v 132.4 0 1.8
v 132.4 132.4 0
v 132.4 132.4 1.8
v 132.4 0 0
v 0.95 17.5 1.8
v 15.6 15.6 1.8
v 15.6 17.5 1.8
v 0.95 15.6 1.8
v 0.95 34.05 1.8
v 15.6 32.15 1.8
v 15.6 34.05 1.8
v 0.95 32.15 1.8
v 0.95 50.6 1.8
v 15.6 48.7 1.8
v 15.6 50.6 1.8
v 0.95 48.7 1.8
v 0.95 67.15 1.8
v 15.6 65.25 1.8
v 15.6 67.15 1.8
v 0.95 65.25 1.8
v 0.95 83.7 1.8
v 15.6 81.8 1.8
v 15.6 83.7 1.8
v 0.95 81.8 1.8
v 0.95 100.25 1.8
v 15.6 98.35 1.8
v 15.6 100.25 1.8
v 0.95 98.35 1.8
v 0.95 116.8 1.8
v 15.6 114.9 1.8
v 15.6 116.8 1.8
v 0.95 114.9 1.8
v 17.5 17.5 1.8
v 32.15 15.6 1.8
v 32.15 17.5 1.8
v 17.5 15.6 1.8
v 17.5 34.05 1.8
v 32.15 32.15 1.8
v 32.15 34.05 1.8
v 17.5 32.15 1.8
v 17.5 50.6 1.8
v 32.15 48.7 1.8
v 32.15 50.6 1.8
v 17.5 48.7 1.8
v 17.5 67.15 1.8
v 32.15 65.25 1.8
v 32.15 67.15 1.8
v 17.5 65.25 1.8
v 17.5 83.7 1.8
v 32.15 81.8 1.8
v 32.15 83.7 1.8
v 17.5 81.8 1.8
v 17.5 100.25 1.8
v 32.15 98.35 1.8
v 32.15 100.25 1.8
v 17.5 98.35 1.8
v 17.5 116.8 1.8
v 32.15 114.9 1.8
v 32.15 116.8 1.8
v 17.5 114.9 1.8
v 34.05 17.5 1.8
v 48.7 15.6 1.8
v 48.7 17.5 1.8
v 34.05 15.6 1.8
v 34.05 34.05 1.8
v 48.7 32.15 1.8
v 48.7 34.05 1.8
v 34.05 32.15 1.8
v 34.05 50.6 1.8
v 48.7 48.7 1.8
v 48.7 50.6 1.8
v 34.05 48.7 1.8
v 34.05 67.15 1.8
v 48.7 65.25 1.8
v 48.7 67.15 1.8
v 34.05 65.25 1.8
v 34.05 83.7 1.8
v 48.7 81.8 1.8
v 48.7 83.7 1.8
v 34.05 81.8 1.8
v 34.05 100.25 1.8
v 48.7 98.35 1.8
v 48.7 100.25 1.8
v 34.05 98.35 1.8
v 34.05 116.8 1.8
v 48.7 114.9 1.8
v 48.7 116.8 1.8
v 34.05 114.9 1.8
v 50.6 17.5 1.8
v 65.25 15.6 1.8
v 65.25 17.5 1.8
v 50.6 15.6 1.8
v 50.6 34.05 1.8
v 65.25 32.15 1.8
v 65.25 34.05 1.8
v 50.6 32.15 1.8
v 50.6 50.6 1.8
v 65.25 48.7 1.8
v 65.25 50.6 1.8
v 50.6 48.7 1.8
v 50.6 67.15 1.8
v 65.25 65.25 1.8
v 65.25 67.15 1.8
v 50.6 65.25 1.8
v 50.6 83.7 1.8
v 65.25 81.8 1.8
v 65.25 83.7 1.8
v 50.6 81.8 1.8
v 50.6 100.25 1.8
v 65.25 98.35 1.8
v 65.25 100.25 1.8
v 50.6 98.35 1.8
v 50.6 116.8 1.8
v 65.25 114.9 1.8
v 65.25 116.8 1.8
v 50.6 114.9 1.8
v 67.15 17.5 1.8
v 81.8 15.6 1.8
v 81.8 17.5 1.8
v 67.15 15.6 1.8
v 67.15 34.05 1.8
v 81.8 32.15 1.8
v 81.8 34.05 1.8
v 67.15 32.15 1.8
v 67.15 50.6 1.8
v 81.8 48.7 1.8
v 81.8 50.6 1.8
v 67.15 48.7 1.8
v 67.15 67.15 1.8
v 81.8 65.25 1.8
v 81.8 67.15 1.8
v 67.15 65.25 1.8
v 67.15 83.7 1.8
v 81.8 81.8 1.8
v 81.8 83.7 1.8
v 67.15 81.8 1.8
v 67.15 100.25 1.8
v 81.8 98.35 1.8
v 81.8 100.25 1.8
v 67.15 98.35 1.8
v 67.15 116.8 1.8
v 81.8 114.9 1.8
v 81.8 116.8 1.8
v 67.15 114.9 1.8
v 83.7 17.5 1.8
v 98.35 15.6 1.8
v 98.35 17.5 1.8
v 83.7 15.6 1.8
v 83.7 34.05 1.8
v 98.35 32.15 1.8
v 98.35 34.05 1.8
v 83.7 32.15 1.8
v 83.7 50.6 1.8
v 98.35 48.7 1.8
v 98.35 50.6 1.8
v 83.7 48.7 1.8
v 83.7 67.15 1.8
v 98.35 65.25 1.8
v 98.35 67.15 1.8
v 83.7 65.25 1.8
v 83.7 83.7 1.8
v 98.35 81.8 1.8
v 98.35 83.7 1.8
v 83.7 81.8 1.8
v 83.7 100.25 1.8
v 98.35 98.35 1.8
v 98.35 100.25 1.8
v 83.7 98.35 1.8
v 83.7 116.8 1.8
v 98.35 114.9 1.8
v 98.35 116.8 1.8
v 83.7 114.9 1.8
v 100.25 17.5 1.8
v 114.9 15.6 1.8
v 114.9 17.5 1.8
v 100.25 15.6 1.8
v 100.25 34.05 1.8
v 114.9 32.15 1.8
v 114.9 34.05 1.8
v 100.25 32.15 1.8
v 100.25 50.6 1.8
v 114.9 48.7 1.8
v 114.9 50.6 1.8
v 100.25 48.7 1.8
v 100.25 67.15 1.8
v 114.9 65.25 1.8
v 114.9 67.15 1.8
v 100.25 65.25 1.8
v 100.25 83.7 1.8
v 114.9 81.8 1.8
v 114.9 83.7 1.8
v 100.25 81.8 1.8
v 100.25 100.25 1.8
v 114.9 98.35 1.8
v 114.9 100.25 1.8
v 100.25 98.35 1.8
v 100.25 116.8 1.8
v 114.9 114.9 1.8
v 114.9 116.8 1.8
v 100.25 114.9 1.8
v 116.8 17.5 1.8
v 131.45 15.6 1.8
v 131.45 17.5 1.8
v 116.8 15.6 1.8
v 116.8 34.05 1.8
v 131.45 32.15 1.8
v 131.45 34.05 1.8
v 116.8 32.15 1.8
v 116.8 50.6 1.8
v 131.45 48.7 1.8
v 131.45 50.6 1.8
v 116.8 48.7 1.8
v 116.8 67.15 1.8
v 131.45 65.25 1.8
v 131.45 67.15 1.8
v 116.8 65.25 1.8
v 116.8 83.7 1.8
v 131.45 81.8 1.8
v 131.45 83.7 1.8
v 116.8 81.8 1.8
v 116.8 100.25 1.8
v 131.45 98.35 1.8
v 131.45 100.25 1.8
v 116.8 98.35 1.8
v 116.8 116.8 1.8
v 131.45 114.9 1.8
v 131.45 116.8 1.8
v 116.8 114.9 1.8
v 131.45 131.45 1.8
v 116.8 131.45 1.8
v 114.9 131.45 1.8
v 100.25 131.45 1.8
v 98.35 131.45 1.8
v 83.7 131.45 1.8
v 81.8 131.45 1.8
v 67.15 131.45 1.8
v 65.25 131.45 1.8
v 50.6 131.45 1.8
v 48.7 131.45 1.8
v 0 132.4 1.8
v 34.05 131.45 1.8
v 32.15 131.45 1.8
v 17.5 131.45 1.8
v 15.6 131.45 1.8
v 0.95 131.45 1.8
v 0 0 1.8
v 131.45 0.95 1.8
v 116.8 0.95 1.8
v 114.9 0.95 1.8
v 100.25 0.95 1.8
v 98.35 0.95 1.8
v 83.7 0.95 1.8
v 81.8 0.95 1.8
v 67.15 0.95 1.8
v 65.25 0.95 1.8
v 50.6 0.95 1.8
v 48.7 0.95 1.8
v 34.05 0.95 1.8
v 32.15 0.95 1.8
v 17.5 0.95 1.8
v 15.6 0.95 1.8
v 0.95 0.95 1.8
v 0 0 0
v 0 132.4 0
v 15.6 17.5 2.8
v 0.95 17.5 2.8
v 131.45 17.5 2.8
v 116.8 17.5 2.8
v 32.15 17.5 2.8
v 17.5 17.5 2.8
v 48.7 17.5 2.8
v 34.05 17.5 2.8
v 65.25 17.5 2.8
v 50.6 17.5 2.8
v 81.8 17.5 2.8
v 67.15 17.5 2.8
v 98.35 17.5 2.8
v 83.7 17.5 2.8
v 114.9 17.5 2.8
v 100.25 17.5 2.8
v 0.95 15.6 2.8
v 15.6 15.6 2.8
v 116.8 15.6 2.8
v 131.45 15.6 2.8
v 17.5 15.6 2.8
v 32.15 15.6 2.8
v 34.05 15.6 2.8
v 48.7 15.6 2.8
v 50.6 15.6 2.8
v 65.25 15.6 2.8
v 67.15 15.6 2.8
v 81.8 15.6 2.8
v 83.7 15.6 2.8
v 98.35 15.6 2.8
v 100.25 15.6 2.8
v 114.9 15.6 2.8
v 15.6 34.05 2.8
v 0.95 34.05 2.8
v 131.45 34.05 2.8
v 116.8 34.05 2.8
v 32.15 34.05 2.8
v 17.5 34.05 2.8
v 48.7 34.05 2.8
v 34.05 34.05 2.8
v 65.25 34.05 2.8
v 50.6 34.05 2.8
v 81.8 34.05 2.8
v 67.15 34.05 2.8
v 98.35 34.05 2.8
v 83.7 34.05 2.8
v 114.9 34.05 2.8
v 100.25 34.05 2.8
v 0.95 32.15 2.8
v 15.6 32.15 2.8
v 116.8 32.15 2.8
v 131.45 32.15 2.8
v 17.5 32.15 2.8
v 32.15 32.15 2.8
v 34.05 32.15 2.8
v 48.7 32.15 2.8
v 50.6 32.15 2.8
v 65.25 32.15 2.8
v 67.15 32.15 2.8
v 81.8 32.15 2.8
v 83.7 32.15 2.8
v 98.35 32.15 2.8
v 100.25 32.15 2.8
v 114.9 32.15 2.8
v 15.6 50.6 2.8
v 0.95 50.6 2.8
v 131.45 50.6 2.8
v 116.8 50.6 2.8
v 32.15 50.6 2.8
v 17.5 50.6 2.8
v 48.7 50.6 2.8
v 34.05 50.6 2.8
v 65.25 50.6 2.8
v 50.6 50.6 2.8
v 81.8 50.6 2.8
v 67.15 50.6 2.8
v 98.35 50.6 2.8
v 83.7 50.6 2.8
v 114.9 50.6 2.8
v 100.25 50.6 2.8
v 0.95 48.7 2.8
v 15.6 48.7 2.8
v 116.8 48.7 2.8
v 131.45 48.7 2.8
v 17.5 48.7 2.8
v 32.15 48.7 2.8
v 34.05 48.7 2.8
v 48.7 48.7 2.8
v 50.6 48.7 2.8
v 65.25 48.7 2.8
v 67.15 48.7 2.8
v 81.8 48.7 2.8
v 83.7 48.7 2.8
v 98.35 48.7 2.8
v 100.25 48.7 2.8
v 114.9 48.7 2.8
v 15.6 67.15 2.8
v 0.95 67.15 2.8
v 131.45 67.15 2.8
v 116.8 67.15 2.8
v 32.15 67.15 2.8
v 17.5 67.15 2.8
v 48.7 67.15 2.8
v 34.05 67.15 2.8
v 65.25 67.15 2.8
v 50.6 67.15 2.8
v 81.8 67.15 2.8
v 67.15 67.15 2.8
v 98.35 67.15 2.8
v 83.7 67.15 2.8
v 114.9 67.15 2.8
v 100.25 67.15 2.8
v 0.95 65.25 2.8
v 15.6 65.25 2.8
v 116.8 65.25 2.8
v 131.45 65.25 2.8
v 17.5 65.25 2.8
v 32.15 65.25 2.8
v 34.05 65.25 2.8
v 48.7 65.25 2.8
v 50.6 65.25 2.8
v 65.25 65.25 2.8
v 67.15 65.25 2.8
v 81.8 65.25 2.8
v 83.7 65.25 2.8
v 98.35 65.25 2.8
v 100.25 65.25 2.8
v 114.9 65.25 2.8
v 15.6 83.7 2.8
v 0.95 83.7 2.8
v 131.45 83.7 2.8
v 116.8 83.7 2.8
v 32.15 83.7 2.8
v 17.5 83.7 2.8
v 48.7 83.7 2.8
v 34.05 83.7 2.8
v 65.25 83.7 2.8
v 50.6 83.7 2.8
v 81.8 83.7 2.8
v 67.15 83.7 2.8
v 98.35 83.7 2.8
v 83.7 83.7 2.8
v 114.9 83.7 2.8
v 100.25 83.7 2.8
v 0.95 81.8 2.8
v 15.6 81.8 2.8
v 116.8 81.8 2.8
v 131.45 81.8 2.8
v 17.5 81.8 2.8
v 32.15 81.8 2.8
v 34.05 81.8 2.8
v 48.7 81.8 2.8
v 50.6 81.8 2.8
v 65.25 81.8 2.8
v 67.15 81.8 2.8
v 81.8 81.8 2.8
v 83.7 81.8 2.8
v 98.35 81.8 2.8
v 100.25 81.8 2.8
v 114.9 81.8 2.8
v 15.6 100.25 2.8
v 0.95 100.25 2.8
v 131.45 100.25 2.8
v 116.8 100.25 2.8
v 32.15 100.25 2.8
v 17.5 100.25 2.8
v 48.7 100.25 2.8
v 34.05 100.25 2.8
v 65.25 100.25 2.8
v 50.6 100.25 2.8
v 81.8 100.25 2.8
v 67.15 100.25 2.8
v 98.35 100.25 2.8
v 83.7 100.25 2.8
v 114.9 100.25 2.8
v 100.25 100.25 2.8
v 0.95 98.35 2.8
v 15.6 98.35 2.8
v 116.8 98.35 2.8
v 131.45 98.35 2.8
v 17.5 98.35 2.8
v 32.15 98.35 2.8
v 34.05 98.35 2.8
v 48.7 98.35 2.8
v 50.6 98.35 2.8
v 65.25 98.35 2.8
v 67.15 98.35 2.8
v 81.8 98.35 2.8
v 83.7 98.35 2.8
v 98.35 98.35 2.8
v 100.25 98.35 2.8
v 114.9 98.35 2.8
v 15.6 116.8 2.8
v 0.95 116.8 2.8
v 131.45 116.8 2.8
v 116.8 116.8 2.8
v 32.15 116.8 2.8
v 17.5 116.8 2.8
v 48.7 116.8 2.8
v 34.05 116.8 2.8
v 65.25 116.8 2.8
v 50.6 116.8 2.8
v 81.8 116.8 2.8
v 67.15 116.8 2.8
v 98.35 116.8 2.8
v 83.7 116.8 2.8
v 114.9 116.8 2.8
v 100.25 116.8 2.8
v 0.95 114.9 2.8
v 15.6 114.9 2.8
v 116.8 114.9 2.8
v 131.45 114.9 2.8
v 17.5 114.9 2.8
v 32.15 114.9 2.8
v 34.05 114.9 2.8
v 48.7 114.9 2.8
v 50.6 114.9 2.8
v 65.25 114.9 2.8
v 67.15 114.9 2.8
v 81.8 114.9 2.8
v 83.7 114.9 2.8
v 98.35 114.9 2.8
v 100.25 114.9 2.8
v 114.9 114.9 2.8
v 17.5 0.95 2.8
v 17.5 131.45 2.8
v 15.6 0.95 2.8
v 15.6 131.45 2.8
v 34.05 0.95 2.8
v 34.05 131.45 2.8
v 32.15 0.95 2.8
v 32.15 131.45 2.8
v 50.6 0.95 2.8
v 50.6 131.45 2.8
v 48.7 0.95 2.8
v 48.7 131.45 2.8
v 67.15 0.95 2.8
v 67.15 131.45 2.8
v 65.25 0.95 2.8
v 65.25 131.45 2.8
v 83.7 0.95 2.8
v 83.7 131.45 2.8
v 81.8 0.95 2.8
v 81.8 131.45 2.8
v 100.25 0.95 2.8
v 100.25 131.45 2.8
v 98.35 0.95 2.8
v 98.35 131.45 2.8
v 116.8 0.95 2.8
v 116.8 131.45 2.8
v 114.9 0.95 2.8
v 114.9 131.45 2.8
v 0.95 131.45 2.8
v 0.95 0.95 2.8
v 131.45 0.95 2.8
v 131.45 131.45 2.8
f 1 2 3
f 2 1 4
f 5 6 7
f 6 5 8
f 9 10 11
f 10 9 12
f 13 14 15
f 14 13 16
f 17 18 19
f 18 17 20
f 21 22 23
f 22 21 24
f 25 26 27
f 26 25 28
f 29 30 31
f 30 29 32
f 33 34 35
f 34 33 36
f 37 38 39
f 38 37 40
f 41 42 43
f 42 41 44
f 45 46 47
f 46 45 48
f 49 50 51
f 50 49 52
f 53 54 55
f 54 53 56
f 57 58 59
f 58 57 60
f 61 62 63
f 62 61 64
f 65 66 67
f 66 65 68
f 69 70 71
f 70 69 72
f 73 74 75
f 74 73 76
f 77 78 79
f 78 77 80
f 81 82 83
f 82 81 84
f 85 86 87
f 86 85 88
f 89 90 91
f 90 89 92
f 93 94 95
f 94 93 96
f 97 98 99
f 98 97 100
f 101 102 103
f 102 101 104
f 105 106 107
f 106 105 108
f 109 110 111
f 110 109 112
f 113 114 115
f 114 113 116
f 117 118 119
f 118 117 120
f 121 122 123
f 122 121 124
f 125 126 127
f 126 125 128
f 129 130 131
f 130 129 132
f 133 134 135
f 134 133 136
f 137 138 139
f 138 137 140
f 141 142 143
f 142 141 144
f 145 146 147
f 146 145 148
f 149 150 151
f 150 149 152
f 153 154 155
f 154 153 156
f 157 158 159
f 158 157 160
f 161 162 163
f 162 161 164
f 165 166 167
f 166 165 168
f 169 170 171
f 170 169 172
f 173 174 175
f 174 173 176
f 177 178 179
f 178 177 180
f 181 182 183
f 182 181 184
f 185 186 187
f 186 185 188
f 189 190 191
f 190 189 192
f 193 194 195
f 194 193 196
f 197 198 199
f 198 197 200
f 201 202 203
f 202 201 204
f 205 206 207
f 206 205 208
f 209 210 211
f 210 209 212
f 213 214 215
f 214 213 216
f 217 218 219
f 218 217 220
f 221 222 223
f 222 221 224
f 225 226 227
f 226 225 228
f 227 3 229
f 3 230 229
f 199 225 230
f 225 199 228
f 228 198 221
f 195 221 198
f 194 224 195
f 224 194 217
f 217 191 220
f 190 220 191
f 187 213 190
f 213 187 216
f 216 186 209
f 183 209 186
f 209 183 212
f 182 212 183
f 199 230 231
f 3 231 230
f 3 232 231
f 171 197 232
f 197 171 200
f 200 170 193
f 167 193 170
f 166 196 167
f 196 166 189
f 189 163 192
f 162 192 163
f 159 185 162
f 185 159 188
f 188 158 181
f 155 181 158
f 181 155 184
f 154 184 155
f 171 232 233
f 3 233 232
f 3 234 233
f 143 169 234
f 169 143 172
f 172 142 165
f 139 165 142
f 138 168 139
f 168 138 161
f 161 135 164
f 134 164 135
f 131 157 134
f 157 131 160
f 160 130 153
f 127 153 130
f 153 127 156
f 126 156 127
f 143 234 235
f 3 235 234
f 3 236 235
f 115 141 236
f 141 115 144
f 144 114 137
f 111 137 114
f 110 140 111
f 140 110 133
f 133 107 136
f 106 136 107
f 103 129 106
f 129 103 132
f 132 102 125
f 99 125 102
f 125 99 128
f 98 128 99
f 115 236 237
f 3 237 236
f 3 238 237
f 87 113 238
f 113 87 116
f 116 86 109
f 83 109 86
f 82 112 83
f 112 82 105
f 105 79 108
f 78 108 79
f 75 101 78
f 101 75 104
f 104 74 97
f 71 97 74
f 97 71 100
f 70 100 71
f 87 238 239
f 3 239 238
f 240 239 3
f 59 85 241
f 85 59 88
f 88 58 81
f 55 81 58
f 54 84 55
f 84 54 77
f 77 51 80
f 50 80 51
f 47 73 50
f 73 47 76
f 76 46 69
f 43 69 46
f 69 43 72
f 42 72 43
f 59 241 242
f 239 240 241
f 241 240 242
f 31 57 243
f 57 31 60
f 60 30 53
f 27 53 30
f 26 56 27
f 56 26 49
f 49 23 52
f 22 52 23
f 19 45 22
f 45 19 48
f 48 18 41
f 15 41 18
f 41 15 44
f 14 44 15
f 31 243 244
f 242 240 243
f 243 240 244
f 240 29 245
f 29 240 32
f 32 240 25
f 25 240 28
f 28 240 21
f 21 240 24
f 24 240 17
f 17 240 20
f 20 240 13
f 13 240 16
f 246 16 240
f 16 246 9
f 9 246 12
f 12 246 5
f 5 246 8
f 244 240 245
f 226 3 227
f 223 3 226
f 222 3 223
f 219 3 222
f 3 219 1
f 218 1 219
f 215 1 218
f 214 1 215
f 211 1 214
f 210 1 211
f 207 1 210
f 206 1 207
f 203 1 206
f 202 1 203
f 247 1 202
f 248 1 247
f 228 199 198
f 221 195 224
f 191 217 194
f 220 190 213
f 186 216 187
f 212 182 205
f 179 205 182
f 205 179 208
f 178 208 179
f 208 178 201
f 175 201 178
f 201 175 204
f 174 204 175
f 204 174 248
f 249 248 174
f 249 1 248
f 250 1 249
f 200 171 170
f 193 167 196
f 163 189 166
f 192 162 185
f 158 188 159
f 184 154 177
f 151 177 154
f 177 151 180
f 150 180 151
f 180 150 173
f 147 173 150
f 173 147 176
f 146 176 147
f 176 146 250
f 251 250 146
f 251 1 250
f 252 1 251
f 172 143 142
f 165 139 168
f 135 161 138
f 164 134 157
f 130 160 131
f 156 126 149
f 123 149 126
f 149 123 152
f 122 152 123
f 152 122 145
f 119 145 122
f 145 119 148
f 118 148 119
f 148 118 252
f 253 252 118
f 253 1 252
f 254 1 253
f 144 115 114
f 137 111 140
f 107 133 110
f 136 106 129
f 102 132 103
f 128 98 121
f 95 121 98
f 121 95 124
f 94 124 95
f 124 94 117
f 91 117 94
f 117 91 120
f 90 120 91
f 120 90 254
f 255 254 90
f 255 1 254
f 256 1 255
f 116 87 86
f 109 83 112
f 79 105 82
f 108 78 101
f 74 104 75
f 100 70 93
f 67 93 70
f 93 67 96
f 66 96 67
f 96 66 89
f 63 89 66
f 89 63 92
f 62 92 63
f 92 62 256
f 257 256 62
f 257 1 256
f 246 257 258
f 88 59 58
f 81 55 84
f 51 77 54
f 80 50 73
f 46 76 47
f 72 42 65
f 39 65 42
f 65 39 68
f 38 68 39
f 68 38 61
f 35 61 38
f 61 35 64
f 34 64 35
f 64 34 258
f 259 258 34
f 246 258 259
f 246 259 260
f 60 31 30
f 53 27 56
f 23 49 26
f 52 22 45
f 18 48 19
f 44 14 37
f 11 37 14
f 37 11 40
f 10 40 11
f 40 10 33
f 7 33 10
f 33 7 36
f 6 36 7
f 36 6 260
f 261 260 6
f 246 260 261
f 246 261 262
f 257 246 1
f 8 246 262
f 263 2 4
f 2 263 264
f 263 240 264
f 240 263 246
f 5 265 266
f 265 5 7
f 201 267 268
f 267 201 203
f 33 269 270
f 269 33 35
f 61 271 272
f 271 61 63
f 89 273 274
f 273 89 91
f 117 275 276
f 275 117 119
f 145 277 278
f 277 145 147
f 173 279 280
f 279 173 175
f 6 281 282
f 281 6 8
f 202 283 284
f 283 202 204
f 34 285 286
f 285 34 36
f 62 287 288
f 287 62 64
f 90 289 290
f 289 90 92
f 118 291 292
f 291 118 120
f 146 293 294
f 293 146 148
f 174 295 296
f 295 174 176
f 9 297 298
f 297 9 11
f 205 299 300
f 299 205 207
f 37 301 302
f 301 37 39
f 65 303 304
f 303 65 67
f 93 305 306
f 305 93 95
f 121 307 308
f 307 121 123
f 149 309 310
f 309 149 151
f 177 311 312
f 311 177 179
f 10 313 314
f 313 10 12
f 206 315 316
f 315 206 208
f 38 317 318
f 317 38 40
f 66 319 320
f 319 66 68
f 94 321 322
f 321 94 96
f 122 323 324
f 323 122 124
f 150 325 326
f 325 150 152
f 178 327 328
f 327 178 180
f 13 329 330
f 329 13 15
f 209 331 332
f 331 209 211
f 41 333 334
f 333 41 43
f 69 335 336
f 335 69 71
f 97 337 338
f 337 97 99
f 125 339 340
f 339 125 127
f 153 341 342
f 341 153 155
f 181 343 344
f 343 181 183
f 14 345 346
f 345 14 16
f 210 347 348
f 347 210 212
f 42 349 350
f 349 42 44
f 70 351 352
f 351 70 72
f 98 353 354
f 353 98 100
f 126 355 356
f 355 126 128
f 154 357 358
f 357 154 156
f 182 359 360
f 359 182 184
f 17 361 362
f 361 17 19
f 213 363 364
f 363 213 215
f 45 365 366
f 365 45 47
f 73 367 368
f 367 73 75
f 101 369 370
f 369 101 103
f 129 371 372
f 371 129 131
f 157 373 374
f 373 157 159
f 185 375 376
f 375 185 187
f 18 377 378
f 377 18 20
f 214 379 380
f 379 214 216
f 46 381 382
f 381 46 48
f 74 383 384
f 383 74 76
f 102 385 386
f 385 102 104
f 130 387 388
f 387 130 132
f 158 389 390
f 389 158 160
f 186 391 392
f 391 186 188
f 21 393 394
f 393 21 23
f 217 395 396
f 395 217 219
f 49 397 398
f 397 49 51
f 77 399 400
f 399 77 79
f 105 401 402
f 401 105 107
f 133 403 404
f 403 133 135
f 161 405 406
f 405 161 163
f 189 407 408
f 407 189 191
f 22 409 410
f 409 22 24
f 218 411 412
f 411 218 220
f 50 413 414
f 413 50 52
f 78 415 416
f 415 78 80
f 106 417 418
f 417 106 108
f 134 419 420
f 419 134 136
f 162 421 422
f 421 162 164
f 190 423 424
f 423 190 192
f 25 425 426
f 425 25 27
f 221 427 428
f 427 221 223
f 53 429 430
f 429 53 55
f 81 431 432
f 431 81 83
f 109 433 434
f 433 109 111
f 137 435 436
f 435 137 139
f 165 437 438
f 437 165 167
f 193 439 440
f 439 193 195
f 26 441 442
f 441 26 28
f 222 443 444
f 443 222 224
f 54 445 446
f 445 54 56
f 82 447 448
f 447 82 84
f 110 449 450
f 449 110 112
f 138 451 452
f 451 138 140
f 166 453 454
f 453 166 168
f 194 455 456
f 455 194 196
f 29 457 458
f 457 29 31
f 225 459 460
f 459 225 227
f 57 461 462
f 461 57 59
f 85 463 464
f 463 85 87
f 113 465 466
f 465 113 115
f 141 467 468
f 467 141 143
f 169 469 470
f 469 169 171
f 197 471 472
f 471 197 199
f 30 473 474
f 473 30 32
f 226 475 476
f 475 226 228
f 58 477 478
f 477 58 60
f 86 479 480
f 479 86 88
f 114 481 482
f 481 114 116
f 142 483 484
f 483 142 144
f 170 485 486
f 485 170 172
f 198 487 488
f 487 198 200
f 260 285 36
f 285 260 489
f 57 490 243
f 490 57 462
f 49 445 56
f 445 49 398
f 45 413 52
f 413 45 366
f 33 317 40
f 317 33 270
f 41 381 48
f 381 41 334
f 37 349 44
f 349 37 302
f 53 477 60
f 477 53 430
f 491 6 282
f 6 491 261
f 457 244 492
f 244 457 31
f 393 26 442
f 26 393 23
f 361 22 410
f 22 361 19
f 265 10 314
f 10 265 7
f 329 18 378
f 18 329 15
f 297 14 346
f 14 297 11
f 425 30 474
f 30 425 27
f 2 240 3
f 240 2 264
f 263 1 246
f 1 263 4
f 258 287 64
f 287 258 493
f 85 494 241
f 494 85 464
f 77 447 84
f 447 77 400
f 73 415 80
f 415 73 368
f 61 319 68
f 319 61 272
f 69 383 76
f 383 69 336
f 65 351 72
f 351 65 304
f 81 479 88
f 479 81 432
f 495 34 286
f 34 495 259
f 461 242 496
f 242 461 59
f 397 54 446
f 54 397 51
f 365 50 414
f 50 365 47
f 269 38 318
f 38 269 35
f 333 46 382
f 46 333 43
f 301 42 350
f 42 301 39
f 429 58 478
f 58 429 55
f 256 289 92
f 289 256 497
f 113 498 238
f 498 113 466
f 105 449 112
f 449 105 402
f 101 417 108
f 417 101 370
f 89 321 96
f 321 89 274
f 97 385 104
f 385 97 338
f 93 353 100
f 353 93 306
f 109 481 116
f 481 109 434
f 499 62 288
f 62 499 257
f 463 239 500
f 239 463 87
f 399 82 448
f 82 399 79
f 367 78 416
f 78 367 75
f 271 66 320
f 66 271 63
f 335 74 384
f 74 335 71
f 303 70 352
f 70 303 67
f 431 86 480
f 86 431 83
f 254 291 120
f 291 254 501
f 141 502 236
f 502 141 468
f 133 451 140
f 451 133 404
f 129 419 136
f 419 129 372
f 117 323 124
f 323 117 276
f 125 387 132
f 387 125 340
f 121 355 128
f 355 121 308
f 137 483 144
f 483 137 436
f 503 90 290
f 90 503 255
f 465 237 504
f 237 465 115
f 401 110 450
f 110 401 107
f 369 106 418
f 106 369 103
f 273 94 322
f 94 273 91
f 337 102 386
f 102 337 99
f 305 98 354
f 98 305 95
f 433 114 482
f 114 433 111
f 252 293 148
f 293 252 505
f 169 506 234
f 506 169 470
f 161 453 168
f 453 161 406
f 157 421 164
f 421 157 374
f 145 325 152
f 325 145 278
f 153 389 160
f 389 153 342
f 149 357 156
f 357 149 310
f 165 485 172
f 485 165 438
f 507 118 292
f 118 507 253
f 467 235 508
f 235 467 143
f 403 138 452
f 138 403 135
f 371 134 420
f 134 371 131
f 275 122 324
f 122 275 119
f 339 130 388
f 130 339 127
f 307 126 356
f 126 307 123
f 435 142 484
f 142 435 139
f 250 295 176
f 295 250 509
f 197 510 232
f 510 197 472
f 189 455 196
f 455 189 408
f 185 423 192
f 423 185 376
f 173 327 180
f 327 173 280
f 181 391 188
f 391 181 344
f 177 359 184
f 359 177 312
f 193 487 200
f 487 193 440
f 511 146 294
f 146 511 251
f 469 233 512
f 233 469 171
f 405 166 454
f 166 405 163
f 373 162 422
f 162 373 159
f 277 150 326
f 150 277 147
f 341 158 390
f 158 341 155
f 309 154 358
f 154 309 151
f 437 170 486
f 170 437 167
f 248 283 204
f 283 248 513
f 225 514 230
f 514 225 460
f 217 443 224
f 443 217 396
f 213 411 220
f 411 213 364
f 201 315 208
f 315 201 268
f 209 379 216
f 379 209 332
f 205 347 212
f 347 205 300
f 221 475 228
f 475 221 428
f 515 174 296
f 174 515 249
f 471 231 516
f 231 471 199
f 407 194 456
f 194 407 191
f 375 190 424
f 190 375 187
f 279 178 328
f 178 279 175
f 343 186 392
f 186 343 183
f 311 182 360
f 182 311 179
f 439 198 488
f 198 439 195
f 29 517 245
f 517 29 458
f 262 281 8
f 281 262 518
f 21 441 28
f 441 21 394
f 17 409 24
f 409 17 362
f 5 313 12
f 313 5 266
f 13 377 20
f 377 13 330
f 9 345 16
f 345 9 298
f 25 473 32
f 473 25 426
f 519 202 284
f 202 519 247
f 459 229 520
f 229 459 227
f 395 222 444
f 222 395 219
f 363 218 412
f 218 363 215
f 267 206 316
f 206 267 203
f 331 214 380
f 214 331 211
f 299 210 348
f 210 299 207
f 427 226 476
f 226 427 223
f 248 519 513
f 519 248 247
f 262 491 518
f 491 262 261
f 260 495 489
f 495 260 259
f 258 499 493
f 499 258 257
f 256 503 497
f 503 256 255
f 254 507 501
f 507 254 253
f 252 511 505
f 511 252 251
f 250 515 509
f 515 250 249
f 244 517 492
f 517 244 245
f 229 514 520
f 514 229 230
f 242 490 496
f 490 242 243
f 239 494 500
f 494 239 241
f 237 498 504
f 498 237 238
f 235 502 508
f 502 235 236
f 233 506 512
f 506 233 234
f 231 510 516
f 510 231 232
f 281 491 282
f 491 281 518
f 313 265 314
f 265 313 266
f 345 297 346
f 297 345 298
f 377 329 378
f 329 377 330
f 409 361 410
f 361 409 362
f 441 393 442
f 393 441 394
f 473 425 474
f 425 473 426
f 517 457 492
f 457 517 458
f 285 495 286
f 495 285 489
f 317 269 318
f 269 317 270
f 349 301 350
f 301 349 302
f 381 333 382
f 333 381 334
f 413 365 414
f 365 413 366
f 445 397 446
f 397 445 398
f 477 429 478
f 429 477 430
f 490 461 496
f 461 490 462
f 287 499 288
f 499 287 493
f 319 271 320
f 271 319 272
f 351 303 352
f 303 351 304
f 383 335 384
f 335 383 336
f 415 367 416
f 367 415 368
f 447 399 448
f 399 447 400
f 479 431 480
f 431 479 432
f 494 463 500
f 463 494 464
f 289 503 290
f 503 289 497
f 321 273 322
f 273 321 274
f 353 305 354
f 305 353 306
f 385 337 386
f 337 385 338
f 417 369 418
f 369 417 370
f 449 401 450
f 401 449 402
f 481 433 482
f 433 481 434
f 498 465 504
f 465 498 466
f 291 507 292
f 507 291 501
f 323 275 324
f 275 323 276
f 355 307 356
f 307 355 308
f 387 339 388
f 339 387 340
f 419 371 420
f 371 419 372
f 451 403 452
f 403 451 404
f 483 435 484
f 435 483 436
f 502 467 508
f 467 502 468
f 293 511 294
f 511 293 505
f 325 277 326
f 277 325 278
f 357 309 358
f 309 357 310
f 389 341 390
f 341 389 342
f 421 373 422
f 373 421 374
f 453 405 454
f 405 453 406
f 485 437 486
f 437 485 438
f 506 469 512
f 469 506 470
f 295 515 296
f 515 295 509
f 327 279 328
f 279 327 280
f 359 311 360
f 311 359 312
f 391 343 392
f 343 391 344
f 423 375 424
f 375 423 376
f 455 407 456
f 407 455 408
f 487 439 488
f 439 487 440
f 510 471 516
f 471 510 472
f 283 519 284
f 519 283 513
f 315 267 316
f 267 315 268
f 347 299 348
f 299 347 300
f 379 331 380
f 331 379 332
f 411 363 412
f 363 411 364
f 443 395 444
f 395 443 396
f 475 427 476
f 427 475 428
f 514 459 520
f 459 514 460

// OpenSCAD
// file: ../config.scad
// General
countX = 8;
countY = 8;

// Based on the LED strips you want to use
ledSize = 4.85;
ledSpacing = 11.7;
ledStripWidth = 10.3;
cellSize = ledSize + ledSpacing;

// Top plate
pixelSpacing = 1.90; 
pixelSize = cellSize - pixelSpacing; 
pixelHeight = 1.00; 
plateHeight = 1.80; 

// Back plate
backPlateHeight = 3.0;
backPlateCutoutWidth = 11.0;
backPlateCutoutDepth = 1.0;
backPlateWiringHole = 3.0;

// Spacer
spacerHeight = 6.0;
spacerWall = 2.0;
spacerKeyHeight = backPlateCutoutDepth - 0.1;
spacerKeyWidth = ledStripWidth - 2;

// Electronics compartment
compartmentHeight = 15.0;
compartmentWall = spacerWall;
compartmentBaseHeight = 2.0;
compartmentHoles = [
  // width, height
  [10, 11], // Bottom
  [0, 0], // Left
  [0, 0], // Right
  [0, 0], // Top
];
// main file
include <../config.scad>;

part = "all"; // "all", "padding", or "pixels"

module top_plate(part = "all") {
    totalWidth = (countX * pixelSize) + (countX * pixelSpacing);
    totalDepth = (countY * pixelSize) + (countY * pixelSpacing);

    // Black padding grid
    if (part == "all" || part == "padding") {
        color("black") {
            for (y = [1:countY-1]) {
                translate([0, y * (pixelSize + pixelSpacing) - pixelSpacing/2, 0])
                    cube([totalWidth, pixelSpacing, plateHeight]);
            }

            for (x = [1:countX-1]) {
                translate([x * (pixelSize + pixelSpacing) - pixelSpacing/2, 0, 0])
                    cube([pixelSpacing, totalDepth, plateHeight]);
            }

            cube([pixelSpacing/2, totalDepth, plateHeight]);
            translate([countX * (pixelSize + pixelSpacing) - pixelSpacing/2, 0, 0])
                cube([pixelSpacing/2, totalDepth, plateHeight]);

            cube([totalWidth, pixelSpacing/2, plateHeight]);
            translate([0, countY * (pixelSize + pixelSpacing) - pixelSpacing/2, 0])
                cube([totalWidth, pixelSpacing/2, plateHeight]);
        }
    }

    // White raised pixel boxes
    if (part == "all" || part == "pixels") {
        color("white")
            for (x = [0:countX-1]) {
                for (y = [0:countY-1]) {
                    translate([pixelSpacing/2 + x * (pixelSize + pixelSpacing),
                              pixelSpacing/2 + y * (pixelSize + pixelSpacing),
                              0])
                        cube([pixelSize, pixelSize, pixelHeight + plateHeight]);
                }
            }
    }
}

top_plate(part);
